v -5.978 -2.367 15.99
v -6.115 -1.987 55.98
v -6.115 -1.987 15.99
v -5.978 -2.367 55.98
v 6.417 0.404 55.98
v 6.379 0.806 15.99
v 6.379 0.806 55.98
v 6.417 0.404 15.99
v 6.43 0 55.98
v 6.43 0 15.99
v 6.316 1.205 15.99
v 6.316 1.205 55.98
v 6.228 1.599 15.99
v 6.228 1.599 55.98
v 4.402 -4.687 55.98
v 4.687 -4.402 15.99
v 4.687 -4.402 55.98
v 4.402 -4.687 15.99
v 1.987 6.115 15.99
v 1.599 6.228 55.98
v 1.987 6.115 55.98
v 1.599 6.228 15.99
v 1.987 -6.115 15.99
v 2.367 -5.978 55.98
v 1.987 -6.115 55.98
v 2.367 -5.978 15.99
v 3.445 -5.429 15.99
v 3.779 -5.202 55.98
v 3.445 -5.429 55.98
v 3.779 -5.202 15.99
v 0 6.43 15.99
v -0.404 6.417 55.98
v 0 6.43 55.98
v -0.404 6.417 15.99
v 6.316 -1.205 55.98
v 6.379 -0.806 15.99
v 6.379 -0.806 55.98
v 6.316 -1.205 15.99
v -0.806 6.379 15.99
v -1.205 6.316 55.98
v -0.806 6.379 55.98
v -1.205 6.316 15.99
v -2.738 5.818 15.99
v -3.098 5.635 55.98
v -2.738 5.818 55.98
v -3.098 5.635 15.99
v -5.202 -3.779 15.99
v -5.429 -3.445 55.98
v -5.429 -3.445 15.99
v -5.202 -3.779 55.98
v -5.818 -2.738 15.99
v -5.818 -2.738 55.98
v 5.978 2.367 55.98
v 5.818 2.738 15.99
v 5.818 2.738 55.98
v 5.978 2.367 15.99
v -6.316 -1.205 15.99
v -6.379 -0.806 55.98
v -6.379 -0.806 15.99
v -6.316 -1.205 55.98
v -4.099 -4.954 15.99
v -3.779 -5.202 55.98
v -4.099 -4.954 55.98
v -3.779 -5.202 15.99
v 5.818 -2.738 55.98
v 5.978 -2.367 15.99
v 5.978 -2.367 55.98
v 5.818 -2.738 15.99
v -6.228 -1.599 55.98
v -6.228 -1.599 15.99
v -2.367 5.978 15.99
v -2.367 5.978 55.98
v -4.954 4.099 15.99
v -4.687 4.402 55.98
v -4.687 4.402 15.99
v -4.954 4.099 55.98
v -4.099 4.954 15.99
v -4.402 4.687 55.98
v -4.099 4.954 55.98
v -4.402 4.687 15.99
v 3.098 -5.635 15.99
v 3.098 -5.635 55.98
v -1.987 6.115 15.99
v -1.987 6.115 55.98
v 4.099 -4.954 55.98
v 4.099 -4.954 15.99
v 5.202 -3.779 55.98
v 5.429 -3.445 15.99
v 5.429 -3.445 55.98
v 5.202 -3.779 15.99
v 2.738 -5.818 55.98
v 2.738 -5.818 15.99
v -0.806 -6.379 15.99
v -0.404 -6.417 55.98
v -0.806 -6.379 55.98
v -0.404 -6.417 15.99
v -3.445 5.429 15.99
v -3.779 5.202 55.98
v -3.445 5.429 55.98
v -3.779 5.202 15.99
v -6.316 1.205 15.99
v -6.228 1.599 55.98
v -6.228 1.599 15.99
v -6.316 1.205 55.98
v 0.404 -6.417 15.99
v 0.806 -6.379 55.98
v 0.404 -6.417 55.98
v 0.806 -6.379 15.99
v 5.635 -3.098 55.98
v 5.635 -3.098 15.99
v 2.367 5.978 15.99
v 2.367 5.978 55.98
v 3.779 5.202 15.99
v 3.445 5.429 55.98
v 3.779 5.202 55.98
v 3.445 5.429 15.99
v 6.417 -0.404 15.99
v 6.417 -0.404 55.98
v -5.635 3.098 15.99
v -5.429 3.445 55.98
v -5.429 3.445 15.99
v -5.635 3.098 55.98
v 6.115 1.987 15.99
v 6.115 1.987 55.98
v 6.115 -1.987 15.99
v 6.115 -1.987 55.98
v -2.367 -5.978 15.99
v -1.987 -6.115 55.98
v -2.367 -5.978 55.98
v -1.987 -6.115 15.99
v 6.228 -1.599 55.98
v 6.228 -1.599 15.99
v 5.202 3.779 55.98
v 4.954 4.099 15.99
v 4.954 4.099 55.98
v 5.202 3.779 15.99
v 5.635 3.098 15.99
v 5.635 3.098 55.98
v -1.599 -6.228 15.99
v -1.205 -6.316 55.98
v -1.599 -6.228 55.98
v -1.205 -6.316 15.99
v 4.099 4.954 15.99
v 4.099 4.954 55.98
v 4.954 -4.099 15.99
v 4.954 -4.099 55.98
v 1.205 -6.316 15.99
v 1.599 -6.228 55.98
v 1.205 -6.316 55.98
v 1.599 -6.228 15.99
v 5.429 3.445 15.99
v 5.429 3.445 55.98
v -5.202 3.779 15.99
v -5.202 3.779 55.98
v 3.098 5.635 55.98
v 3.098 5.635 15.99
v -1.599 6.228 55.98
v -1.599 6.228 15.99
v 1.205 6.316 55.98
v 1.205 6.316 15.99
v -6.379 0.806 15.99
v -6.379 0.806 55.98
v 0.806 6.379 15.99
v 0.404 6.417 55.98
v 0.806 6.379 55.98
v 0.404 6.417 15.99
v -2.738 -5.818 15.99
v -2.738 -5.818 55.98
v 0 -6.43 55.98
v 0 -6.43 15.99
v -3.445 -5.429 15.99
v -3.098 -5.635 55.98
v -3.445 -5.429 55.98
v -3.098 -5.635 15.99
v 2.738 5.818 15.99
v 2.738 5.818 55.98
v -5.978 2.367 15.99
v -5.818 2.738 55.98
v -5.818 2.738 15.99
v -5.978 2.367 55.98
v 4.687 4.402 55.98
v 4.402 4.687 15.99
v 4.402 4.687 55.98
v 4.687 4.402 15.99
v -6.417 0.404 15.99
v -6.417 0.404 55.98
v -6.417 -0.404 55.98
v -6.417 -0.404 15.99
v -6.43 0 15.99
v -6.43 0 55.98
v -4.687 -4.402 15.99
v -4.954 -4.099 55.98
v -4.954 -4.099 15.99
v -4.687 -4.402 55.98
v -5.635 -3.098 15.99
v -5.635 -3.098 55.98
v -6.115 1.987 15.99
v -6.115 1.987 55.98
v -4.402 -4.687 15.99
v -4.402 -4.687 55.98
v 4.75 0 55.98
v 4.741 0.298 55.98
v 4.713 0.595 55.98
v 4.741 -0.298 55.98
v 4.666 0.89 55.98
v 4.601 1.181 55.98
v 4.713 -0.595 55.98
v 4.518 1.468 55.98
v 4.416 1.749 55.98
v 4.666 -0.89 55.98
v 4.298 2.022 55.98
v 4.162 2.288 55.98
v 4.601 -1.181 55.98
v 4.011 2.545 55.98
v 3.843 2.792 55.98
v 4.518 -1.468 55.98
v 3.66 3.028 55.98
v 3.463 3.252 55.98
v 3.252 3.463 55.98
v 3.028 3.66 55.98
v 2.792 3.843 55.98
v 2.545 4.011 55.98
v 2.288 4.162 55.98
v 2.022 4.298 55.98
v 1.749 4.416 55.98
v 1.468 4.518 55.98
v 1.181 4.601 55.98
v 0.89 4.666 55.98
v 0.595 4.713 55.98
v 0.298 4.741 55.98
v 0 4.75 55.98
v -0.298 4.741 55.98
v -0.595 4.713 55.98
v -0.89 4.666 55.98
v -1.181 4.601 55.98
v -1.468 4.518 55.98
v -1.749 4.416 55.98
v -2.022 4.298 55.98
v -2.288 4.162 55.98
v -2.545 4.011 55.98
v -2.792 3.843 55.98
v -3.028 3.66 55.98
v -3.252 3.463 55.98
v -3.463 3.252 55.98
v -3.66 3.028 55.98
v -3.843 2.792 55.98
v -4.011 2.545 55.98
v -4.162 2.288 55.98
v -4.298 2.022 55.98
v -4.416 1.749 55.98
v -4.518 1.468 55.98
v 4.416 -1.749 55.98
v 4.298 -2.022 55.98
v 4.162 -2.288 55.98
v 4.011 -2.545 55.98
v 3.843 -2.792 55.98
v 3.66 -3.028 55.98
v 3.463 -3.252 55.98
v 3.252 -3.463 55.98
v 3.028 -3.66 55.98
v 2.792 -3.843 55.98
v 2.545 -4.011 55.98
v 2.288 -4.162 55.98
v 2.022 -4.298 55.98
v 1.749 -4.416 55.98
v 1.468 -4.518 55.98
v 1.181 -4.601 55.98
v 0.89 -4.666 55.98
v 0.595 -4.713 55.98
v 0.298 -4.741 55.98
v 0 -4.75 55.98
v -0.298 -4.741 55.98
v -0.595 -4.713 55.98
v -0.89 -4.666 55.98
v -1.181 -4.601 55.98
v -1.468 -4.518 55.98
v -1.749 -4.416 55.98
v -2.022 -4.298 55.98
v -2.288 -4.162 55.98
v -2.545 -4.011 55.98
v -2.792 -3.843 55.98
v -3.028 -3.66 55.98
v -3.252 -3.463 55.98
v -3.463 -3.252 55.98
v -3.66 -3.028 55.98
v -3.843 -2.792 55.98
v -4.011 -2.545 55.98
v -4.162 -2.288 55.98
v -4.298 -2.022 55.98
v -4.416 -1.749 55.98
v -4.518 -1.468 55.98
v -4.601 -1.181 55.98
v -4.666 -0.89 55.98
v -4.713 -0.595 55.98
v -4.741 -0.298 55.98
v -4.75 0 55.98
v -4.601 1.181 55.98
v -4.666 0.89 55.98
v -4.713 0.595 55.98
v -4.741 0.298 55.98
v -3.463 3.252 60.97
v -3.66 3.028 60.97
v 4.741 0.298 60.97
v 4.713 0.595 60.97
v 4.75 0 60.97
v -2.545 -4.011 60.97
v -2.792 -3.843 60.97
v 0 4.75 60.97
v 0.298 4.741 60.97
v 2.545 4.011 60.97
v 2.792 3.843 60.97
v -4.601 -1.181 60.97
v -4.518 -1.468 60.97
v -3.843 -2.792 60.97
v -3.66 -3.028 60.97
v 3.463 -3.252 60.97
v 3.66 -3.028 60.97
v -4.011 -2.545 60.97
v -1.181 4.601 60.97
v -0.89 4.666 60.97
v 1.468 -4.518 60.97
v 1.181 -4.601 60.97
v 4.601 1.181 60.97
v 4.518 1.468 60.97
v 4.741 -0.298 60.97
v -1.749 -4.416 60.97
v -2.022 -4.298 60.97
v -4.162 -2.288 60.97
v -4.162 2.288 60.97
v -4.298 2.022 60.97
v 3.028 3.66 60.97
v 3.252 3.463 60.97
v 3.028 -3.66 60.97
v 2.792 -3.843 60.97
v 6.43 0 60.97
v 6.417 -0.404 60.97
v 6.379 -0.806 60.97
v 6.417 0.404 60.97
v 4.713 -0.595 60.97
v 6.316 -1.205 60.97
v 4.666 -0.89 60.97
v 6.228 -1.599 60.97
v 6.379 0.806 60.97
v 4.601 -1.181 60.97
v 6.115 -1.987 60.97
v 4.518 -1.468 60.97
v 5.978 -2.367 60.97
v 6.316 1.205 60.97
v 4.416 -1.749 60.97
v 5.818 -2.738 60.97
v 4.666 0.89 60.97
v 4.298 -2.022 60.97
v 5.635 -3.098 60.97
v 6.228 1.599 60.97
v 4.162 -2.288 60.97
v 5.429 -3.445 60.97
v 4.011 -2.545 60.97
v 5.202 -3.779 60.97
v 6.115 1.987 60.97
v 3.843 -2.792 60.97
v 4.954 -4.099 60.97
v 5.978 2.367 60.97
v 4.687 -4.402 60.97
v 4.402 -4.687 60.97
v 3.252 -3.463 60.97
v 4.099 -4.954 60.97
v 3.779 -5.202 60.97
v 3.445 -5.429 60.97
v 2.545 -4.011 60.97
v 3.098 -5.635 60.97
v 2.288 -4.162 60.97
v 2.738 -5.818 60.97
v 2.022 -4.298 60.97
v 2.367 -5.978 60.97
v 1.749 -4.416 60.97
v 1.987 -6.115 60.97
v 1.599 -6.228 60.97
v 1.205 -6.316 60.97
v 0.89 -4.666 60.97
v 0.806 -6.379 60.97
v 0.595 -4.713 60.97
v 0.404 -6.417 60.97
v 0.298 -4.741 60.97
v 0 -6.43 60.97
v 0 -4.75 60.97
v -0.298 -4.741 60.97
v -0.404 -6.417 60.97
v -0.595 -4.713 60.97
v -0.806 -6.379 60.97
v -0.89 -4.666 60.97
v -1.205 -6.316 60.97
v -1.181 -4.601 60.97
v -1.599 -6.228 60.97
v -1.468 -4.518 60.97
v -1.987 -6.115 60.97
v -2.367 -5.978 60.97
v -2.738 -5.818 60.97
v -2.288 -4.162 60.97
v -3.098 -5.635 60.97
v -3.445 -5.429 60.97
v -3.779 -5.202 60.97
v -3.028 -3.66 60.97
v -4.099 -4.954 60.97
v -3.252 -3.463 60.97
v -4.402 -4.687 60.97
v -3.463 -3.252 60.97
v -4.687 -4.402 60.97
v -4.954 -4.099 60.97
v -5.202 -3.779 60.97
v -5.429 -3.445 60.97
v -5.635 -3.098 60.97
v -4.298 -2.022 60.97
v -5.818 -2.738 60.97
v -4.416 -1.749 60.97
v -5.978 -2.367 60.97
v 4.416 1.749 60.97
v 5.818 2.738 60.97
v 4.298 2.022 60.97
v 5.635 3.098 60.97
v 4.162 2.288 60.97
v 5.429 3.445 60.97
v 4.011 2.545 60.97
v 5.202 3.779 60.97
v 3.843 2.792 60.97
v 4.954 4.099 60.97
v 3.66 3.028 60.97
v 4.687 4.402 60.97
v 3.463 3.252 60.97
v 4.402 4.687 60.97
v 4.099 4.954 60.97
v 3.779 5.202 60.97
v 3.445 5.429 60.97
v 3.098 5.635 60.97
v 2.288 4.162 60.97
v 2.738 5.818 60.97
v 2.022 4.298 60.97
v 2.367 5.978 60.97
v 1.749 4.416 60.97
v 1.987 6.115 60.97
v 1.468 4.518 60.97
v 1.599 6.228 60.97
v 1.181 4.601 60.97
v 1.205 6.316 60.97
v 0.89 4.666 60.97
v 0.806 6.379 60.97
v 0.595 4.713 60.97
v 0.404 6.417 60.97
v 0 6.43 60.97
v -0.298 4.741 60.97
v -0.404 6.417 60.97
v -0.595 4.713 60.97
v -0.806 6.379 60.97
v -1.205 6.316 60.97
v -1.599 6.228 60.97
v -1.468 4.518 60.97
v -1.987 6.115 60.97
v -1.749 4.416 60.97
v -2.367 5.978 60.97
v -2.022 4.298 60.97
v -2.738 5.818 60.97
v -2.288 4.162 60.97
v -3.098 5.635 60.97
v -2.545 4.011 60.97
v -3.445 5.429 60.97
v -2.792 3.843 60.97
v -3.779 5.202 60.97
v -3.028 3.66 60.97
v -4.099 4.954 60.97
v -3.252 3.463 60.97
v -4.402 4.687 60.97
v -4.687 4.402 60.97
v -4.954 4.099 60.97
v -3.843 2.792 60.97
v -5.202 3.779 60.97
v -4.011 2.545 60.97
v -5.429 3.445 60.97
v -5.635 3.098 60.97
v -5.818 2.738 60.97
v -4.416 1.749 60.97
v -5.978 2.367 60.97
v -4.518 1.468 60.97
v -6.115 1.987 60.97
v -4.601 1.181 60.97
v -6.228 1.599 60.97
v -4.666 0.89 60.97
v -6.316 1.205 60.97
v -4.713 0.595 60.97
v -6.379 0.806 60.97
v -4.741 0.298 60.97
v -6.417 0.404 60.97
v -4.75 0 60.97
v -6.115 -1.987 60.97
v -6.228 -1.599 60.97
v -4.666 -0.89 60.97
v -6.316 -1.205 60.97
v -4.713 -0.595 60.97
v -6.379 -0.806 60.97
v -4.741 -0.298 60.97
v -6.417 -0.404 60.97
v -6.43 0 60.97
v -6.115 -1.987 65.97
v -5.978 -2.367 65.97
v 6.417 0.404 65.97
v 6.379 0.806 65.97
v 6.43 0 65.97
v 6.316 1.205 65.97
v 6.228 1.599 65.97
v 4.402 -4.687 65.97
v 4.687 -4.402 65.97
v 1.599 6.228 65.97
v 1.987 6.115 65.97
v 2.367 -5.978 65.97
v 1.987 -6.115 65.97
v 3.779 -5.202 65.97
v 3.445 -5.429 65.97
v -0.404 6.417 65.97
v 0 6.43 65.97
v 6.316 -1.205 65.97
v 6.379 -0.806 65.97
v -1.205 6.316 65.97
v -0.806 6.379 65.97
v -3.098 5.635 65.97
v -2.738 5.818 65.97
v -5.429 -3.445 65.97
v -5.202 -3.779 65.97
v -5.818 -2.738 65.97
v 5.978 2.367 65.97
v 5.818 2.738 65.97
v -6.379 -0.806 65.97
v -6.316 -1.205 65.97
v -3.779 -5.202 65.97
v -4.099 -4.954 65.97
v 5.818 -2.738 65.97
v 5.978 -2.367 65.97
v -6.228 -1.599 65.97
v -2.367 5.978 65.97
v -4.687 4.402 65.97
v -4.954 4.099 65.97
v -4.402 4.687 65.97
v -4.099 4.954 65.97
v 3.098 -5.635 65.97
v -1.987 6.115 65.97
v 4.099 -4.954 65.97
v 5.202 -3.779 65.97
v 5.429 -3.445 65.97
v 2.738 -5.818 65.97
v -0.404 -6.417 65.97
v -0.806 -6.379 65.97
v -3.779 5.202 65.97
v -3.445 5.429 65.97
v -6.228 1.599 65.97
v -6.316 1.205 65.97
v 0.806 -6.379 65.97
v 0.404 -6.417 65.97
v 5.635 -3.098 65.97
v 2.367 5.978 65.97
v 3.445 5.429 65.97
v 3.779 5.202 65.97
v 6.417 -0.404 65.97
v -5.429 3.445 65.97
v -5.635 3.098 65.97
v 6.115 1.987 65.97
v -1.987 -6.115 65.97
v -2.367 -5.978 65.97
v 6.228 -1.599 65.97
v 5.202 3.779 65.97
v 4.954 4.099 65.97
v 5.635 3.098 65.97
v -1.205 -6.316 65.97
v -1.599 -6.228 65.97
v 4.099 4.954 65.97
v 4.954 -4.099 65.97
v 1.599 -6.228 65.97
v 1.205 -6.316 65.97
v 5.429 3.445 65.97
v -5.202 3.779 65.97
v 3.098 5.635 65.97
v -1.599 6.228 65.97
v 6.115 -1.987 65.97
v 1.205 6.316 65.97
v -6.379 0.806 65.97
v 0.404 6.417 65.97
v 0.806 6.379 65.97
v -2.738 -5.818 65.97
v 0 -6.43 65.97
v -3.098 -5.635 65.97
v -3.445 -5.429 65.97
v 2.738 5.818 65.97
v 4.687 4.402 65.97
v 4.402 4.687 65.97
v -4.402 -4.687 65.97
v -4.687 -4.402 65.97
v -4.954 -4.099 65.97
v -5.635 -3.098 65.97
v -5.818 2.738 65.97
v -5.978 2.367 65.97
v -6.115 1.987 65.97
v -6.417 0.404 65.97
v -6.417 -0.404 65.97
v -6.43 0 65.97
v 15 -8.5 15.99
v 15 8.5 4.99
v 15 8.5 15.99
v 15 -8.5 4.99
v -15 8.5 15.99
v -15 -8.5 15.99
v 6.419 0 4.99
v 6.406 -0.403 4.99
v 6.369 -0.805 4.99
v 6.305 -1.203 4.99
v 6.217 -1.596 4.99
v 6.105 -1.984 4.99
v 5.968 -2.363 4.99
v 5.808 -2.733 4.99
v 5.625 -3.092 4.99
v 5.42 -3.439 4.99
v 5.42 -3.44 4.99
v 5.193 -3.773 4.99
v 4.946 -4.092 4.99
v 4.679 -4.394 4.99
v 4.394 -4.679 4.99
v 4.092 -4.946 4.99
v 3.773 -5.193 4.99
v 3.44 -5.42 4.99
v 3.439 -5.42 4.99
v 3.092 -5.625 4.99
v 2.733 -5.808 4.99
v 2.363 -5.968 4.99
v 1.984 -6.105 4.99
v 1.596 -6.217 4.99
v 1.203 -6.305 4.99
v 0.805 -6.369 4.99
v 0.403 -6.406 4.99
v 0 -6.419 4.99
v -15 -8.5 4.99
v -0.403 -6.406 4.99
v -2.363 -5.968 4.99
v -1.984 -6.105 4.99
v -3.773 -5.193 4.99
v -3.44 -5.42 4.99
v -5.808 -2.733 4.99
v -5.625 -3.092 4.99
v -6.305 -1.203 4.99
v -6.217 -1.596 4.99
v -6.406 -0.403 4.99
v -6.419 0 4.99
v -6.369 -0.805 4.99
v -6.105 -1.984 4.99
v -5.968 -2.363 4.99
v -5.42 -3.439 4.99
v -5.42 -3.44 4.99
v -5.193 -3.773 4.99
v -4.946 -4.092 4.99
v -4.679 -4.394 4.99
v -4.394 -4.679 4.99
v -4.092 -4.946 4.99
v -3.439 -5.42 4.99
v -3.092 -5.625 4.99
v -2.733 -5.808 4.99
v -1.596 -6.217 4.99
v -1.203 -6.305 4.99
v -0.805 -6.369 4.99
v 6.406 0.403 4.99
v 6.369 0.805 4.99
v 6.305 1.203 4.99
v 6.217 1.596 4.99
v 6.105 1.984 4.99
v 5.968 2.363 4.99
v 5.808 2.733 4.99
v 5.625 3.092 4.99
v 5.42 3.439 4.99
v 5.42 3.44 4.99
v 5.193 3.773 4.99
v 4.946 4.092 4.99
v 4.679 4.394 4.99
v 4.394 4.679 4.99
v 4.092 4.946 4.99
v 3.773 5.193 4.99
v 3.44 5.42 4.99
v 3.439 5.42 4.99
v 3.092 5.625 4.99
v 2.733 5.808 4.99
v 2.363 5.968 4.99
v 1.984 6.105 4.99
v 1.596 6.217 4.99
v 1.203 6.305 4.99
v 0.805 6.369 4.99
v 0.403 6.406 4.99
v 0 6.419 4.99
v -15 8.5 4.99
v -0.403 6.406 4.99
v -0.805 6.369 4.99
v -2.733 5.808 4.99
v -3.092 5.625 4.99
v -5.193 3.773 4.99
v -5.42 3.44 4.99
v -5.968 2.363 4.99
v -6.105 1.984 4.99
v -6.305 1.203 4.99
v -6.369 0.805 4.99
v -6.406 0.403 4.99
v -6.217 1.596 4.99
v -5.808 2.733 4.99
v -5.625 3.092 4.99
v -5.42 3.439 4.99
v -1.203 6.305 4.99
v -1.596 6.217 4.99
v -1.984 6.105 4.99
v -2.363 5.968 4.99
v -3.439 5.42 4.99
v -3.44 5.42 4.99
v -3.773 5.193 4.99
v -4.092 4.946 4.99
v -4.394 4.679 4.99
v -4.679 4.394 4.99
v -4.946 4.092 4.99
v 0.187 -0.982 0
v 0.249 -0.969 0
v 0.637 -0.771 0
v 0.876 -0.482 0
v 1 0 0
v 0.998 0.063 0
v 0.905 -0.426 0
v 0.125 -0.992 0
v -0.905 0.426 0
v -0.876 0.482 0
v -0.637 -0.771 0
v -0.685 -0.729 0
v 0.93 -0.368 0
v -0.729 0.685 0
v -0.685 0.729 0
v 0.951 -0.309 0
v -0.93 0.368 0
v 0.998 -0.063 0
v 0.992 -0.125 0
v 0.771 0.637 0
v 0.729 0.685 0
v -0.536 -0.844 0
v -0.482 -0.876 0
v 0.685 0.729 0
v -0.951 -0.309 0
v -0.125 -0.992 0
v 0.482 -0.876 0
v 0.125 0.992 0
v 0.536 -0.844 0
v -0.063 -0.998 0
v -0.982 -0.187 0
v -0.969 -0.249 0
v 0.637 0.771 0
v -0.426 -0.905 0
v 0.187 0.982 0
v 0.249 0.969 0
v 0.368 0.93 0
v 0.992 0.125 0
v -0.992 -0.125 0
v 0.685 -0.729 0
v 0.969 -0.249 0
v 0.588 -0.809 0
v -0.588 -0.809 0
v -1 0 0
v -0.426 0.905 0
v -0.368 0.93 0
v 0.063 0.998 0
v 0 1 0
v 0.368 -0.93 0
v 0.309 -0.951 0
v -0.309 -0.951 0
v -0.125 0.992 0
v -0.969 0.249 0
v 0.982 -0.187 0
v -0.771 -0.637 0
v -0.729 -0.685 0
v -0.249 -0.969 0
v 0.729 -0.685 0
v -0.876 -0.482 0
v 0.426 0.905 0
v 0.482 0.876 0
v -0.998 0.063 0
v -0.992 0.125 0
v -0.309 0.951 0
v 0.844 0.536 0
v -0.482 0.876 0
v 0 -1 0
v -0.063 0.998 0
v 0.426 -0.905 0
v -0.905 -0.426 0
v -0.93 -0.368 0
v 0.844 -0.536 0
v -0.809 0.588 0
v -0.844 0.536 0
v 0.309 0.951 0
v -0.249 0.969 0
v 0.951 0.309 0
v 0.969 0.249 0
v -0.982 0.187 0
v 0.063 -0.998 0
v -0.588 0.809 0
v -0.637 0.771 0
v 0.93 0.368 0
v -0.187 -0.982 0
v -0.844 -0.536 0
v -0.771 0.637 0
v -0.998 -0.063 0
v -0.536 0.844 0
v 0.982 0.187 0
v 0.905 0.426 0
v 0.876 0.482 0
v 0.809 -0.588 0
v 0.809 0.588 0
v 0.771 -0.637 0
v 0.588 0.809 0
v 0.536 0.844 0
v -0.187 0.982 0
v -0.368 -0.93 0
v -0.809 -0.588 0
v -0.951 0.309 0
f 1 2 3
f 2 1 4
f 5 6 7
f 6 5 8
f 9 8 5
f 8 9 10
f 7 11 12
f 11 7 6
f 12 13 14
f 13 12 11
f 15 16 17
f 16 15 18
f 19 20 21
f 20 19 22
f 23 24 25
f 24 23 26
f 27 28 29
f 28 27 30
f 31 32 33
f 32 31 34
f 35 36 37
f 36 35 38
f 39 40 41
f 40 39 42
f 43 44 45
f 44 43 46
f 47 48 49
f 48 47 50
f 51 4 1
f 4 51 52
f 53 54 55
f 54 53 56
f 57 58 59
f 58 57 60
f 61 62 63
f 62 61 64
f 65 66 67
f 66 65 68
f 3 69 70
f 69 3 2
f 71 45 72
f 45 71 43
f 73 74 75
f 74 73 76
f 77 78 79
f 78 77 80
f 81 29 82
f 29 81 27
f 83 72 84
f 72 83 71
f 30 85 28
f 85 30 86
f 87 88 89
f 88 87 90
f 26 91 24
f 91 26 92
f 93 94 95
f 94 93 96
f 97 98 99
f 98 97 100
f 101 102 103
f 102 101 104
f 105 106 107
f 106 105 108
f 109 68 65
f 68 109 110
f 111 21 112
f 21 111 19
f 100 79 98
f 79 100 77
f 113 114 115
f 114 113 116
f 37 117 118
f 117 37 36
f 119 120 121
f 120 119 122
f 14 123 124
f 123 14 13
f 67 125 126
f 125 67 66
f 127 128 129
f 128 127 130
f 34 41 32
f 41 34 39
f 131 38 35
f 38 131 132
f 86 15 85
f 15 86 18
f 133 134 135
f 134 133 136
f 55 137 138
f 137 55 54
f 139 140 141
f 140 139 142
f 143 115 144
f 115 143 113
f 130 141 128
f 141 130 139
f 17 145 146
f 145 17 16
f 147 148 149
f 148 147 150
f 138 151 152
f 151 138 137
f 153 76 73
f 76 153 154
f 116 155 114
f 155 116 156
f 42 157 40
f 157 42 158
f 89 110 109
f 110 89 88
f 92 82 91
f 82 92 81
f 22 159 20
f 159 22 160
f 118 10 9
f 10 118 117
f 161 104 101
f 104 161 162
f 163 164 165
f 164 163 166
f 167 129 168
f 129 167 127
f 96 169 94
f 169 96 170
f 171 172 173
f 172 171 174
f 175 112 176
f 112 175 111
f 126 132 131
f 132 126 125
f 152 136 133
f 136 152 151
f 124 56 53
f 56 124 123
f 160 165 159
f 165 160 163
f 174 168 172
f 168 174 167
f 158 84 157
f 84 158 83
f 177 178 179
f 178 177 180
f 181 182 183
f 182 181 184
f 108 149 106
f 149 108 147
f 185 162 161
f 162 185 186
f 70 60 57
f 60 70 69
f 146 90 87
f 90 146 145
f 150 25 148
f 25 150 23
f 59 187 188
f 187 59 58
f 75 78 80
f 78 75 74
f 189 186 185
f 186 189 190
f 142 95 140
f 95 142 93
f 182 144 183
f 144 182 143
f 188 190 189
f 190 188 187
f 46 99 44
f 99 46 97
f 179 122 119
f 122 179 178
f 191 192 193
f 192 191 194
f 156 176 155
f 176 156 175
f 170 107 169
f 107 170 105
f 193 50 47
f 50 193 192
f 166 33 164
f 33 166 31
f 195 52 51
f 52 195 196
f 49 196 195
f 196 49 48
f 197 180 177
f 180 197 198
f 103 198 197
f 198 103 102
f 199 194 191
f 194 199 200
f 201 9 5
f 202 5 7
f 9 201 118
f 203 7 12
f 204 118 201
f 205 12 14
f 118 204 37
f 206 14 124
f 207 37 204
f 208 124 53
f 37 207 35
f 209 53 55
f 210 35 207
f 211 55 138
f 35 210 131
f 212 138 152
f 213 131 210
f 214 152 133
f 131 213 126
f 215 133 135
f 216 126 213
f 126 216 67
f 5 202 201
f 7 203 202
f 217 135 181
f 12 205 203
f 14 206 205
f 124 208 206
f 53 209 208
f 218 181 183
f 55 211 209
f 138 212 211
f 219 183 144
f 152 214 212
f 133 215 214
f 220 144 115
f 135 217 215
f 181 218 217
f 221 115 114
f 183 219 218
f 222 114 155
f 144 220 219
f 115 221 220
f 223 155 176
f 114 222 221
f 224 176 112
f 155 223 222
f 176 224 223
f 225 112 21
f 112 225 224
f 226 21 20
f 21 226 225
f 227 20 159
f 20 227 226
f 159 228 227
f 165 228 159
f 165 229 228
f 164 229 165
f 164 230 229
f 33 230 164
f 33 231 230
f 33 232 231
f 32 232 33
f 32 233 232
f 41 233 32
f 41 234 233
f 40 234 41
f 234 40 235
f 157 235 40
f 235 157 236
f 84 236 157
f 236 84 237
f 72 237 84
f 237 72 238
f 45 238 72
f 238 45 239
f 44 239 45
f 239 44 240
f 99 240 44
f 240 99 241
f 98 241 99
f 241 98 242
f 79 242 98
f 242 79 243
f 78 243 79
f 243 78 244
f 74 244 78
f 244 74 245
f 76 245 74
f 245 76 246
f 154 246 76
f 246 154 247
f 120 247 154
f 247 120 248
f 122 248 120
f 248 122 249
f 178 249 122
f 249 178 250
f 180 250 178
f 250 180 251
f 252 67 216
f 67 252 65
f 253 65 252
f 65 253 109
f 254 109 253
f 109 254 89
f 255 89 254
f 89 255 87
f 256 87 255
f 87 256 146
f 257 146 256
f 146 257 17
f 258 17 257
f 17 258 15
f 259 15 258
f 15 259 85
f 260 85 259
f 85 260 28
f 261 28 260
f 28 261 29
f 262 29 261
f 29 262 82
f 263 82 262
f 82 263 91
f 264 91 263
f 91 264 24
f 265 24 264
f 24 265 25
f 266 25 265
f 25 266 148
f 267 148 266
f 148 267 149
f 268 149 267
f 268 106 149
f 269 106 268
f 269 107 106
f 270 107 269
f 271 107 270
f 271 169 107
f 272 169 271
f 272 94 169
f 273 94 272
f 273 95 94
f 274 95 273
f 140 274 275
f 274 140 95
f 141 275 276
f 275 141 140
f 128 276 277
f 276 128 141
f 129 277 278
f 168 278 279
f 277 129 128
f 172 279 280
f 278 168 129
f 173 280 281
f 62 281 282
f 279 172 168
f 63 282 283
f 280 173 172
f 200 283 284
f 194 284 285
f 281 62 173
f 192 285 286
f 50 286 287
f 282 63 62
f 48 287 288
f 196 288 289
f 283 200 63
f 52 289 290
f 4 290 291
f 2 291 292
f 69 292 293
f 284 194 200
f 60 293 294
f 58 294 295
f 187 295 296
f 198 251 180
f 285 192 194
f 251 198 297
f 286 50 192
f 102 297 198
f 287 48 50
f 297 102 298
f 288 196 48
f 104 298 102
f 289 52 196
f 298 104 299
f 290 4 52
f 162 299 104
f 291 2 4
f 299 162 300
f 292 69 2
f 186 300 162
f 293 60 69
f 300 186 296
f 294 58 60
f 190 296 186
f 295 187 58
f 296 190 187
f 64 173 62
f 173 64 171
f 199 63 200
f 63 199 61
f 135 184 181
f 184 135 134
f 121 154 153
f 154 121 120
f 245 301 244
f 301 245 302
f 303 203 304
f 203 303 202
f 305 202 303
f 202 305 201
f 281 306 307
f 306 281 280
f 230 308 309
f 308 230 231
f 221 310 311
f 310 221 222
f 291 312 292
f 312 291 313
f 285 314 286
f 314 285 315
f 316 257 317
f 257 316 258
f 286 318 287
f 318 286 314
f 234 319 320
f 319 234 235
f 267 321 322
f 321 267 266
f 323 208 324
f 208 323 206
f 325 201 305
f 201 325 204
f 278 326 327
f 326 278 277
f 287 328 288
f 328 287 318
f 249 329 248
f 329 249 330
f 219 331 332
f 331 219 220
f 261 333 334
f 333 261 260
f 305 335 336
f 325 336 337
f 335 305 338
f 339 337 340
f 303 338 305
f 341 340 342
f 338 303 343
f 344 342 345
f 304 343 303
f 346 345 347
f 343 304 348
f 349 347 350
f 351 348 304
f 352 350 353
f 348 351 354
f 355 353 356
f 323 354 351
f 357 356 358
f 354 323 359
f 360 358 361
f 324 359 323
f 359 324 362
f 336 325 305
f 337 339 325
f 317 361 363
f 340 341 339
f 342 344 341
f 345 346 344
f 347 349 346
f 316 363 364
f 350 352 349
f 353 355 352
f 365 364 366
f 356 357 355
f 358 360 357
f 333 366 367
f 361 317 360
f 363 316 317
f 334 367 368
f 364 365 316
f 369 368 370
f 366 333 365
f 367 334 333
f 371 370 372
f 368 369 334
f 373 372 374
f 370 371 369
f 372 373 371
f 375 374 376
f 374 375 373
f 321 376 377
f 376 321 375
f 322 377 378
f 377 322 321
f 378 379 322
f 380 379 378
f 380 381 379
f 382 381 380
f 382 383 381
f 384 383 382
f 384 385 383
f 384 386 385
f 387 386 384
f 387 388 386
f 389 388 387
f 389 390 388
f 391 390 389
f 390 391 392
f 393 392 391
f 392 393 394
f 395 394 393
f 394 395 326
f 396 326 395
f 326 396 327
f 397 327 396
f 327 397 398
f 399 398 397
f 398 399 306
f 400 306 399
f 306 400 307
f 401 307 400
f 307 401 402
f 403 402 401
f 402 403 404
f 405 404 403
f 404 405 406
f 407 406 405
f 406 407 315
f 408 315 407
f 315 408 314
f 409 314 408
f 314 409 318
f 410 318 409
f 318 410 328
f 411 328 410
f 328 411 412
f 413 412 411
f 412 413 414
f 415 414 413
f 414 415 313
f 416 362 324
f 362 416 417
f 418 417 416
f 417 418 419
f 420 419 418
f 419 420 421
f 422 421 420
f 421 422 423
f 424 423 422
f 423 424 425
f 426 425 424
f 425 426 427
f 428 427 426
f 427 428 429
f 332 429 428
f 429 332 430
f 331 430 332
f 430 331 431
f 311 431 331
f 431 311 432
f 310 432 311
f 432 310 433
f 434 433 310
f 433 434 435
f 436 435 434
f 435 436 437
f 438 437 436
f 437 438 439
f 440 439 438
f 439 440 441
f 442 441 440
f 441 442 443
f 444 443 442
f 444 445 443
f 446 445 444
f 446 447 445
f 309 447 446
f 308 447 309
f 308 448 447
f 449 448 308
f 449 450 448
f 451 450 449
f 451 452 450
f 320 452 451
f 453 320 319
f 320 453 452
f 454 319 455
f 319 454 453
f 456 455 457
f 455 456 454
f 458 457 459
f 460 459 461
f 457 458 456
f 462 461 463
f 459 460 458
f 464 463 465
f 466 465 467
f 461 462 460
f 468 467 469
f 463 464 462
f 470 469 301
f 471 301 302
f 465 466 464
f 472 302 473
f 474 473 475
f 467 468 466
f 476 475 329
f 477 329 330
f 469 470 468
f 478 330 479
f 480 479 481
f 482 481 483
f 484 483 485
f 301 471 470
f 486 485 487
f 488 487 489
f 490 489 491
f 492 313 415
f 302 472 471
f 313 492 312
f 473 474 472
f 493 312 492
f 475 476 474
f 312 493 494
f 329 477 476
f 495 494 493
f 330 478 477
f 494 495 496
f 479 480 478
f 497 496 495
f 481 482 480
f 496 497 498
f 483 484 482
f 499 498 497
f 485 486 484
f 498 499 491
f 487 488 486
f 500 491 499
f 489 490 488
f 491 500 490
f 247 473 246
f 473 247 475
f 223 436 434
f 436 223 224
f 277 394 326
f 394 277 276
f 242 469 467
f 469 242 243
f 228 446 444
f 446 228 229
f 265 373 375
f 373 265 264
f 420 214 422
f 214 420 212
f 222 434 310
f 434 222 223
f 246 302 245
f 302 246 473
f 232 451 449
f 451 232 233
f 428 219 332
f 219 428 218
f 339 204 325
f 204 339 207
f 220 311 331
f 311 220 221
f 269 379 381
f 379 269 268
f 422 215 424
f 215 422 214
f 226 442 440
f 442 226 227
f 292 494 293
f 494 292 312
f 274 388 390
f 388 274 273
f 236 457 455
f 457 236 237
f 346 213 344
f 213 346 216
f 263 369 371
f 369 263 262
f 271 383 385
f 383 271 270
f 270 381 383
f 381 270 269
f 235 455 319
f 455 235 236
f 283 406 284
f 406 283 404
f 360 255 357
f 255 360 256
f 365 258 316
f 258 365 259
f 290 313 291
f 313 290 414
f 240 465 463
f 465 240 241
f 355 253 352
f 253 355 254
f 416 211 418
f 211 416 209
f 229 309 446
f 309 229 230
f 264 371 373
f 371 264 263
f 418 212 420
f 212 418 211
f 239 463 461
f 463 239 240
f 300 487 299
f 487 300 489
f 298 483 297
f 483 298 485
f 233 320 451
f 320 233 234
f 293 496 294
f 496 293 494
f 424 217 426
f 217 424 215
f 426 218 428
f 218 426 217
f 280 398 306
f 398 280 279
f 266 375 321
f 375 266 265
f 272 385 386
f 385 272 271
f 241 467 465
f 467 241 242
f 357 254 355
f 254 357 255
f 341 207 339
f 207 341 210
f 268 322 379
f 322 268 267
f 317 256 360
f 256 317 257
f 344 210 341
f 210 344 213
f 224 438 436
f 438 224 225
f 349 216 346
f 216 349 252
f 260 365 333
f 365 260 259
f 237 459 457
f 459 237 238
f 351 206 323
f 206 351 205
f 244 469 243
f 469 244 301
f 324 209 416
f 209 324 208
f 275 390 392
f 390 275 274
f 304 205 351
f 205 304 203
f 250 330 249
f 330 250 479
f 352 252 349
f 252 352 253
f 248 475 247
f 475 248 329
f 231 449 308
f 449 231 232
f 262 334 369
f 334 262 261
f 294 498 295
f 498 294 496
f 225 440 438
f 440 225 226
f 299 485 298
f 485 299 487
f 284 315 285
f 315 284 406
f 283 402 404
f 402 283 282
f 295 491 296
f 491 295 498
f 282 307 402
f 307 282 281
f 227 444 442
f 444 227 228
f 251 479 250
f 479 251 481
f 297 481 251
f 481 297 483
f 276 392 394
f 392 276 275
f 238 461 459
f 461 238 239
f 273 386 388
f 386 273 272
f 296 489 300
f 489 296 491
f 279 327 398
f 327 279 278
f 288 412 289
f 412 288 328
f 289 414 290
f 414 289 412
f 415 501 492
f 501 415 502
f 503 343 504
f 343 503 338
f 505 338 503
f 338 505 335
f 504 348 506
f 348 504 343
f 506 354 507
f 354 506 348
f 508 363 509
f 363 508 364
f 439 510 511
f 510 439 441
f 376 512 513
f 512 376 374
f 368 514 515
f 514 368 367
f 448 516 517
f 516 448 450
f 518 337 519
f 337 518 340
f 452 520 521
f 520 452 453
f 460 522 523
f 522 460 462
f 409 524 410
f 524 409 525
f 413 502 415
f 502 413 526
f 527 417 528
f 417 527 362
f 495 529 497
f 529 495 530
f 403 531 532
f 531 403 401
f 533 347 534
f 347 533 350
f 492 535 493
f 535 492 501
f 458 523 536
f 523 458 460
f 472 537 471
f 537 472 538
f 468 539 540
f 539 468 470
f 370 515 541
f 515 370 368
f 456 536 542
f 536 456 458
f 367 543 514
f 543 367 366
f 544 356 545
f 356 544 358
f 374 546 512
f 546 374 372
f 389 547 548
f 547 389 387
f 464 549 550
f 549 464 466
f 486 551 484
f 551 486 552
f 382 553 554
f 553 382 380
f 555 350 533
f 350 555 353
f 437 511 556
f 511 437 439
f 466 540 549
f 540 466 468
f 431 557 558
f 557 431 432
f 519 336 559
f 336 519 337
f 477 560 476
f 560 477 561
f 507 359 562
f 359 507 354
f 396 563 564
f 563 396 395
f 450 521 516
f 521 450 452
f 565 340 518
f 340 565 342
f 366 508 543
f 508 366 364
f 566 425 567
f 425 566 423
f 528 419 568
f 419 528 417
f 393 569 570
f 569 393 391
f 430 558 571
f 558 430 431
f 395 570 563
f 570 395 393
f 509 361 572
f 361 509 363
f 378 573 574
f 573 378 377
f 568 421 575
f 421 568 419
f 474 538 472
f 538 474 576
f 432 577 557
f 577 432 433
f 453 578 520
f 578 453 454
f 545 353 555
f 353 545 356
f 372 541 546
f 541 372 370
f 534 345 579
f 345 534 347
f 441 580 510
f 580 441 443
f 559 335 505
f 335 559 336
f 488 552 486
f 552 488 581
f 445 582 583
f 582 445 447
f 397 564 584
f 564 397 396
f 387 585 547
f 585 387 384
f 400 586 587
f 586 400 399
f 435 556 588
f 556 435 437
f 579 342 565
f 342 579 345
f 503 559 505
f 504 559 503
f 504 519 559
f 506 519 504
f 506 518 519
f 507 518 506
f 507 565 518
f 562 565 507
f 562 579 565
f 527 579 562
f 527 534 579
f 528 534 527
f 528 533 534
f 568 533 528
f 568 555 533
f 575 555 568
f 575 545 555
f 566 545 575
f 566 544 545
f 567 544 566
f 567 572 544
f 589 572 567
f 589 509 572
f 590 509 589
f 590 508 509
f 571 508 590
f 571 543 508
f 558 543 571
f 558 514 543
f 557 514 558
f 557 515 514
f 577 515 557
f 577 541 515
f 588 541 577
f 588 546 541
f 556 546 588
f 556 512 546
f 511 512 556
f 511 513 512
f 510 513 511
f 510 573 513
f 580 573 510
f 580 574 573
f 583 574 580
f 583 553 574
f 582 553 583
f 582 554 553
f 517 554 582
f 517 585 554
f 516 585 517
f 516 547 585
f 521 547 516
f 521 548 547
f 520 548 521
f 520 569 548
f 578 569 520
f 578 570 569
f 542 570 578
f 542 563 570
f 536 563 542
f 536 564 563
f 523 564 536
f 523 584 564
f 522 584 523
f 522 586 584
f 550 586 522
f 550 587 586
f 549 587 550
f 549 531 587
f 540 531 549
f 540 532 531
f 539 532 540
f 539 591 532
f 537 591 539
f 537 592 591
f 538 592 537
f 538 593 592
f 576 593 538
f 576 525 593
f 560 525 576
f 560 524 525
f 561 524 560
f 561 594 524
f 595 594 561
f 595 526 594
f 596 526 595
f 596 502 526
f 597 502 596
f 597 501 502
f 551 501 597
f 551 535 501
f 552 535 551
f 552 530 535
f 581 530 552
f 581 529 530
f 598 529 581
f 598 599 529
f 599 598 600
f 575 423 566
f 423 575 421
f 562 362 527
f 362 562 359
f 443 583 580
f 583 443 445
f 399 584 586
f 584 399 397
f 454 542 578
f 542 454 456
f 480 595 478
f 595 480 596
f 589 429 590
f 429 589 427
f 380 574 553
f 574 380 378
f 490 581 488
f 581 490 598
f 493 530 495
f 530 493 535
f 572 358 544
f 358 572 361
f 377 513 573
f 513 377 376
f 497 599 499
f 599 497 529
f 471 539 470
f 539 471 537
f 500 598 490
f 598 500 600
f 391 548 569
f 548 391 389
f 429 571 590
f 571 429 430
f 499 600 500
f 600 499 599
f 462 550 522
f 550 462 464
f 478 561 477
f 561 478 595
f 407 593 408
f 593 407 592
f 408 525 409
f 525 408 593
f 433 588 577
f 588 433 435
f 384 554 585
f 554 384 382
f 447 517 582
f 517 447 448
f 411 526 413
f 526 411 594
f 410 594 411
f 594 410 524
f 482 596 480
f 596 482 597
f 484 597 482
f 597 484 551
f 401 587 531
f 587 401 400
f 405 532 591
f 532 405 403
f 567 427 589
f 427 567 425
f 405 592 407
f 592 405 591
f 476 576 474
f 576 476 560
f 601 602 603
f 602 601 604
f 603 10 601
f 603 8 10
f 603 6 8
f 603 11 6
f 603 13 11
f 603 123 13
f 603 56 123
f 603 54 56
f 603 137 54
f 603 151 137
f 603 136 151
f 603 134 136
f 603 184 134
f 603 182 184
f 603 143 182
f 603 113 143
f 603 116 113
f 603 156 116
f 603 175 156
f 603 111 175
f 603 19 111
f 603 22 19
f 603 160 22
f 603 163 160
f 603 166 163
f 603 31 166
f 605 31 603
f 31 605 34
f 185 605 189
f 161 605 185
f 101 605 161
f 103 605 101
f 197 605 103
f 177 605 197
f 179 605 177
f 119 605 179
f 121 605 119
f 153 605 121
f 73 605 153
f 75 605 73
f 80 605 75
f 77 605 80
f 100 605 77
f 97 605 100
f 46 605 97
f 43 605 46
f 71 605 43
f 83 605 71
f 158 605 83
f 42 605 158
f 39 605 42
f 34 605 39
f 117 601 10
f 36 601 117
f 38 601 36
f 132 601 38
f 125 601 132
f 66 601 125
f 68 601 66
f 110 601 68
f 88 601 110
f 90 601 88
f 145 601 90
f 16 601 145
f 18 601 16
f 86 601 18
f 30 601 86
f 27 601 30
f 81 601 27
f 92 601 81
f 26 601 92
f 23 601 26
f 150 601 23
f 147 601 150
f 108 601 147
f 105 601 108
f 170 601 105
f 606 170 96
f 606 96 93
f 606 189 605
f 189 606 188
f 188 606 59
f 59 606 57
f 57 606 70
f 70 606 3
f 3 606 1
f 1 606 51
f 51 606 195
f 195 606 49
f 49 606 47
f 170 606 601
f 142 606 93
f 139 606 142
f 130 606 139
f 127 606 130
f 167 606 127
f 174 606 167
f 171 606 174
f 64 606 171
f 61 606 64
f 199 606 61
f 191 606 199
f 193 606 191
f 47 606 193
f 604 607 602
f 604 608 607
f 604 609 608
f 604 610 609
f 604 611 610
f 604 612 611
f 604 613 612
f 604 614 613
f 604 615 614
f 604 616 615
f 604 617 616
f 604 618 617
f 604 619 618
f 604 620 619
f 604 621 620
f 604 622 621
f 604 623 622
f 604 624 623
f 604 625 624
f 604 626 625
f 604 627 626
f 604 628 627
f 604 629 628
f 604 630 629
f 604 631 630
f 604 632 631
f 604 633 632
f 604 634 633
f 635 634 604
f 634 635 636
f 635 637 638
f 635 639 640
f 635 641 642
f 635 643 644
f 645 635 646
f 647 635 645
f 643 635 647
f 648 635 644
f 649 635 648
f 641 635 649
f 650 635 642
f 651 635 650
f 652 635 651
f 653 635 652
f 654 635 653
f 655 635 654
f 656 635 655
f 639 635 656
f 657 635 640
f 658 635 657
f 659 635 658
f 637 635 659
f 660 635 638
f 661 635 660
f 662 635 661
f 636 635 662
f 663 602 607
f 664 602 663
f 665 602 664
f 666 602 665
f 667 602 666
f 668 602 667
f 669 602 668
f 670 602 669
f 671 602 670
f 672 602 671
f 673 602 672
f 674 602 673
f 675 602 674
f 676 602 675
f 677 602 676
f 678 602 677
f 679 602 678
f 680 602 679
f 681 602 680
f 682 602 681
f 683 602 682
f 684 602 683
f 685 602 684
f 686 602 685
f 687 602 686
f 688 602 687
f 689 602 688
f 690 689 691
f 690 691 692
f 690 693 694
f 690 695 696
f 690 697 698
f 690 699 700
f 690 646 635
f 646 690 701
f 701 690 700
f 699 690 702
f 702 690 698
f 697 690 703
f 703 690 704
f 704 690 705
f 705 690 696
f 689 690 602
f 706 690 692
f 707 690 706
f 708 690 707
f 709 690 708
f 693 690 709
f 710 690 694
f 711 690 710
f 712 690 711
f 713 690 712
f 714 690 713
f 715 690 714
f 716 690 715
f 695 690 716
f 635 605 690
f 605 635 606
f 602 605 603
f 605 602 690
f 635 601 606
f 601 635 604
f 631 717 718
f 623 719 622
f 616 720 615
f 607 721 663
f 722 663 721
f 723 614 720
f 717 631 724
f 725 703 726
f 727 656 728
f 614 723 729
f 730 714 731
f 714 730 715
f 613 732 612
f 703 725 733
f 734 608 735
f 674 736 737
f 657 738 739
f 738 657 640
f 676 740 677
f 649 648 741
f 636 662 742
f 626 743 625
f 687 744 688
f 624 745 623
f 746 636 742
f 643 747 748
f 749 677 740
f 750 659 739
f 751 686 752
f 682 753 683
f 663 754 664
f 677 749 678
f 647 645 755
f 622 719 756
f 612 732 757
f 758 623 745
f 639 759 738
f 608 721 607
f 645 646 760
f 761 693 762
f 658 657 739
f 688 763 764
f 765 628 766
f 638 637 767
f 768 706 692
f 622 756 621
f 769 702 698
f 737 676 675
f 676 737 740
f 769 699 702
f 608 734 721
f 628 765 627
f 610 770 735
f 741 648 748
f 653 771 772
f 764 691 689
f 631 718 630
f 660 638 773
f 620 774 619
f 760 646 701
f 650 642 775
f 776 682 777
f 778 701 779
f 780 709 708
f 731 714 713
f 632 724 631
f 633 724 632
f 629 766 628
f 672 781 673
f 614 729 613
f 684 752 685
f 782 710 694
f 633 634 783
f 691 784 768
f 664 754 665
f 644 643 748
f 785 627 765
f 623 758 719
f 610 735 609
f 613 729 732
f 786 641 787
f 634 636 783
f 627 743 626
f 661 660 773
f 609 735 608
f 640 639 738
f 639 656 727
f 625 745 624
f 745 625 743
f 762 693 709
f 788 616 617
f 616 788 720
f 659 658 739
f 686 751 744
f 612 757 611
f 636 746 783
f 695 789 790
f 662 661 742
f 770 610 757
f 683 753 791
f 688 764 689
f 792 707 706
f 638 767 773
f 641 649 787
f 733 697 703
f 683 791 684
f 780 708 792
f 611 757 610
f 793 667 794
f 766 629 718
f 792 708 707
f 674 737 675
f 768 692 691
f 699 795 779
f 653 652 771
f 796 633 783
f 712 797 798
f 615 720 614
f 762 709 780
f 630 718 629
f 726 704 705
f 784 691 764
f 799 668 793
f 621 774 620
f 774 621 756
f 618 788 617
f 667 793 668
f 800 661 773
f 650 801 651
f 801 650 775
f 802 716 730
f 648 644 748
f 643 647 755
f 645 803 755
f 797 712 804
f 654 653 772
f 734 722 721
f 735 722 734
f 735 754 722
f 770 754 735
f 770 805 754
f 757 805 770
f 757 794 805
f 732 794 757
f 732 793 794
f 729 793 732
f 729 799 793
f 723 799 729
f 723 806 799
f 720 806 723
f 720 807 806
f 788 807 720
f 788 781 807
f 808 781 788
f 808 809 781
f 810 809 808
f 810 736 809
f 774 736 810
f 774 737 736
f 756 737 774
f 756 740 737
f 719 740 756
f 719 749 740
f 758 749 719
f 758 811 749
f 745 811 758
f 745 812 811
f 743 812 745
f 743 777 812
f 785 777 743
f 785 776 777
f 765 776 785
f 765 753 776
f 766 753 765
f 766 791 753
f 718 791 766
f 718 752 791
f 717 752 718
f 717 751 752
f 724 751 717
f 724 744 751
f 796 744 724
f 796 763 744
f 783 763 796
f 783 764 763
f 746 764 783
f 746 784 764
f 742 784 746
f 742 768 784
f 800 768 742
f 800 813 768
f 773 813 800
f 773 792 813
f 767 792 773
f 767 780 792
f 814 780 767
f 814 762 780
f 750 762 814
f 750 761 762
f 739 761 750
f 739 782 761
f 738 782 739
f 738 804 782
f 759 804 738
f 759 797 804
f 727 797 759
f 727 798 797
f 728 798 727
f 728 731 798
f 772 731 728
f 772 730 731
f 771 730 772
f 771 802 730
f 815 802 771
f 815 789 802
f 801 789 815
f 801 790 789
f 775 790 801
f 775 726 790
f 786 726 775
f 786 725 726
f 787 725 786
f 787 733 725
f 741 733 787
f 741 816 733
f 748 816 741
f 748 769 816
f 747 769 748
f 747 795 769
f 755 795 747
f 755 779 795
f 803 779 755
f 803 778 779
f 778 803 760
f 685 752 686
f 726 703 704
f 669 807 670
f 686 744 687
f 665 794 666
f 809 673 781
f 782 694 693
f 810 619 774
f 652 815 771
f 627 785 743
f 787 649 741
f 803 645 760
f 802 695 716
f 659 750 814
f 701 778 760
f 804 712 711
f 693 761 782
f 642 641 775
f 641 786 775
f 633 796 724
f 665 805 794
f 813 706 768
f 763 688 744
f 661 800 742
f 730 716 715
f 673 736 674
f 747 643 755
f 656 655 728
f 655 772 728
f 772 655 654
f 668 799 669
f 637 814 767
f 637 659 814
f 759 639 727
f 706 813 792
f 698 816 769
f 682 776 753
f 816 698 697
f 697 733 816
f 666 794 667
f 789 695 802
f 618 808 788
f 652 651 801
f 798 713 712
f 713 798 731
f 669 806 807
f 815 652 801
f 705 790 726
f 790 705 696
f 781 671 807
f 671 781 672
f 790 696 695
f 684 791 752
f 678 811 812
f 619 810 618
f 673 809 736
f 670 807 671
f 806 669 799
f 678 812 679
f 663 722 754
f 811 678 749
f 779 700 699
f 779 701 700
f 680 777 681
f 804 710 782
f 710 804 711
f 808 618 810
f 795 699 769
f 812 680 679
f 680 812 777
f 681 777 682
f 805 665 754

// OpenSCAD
//TranKILLoman's extruder

/*
*L'extrudeur de tranKILLoman qui servira à la reprap
* et qui a des dimmensions bizares
*/

$fn=100;

module extrudeur(){
	translate([0,0,15.98])
		cylinder(r=6.43, h=40);
	translate([0,0,55.97])
		cylinder(r=4.75, h=5);
	translate([0,0,60.97])
		cylinder(r=6.43, h=5);
	translate([-15,-8.5,4.99])	cube([30,17,11]);
	cylinder(r1=1,r2=6.43, h=5);
}
extrudeur();
